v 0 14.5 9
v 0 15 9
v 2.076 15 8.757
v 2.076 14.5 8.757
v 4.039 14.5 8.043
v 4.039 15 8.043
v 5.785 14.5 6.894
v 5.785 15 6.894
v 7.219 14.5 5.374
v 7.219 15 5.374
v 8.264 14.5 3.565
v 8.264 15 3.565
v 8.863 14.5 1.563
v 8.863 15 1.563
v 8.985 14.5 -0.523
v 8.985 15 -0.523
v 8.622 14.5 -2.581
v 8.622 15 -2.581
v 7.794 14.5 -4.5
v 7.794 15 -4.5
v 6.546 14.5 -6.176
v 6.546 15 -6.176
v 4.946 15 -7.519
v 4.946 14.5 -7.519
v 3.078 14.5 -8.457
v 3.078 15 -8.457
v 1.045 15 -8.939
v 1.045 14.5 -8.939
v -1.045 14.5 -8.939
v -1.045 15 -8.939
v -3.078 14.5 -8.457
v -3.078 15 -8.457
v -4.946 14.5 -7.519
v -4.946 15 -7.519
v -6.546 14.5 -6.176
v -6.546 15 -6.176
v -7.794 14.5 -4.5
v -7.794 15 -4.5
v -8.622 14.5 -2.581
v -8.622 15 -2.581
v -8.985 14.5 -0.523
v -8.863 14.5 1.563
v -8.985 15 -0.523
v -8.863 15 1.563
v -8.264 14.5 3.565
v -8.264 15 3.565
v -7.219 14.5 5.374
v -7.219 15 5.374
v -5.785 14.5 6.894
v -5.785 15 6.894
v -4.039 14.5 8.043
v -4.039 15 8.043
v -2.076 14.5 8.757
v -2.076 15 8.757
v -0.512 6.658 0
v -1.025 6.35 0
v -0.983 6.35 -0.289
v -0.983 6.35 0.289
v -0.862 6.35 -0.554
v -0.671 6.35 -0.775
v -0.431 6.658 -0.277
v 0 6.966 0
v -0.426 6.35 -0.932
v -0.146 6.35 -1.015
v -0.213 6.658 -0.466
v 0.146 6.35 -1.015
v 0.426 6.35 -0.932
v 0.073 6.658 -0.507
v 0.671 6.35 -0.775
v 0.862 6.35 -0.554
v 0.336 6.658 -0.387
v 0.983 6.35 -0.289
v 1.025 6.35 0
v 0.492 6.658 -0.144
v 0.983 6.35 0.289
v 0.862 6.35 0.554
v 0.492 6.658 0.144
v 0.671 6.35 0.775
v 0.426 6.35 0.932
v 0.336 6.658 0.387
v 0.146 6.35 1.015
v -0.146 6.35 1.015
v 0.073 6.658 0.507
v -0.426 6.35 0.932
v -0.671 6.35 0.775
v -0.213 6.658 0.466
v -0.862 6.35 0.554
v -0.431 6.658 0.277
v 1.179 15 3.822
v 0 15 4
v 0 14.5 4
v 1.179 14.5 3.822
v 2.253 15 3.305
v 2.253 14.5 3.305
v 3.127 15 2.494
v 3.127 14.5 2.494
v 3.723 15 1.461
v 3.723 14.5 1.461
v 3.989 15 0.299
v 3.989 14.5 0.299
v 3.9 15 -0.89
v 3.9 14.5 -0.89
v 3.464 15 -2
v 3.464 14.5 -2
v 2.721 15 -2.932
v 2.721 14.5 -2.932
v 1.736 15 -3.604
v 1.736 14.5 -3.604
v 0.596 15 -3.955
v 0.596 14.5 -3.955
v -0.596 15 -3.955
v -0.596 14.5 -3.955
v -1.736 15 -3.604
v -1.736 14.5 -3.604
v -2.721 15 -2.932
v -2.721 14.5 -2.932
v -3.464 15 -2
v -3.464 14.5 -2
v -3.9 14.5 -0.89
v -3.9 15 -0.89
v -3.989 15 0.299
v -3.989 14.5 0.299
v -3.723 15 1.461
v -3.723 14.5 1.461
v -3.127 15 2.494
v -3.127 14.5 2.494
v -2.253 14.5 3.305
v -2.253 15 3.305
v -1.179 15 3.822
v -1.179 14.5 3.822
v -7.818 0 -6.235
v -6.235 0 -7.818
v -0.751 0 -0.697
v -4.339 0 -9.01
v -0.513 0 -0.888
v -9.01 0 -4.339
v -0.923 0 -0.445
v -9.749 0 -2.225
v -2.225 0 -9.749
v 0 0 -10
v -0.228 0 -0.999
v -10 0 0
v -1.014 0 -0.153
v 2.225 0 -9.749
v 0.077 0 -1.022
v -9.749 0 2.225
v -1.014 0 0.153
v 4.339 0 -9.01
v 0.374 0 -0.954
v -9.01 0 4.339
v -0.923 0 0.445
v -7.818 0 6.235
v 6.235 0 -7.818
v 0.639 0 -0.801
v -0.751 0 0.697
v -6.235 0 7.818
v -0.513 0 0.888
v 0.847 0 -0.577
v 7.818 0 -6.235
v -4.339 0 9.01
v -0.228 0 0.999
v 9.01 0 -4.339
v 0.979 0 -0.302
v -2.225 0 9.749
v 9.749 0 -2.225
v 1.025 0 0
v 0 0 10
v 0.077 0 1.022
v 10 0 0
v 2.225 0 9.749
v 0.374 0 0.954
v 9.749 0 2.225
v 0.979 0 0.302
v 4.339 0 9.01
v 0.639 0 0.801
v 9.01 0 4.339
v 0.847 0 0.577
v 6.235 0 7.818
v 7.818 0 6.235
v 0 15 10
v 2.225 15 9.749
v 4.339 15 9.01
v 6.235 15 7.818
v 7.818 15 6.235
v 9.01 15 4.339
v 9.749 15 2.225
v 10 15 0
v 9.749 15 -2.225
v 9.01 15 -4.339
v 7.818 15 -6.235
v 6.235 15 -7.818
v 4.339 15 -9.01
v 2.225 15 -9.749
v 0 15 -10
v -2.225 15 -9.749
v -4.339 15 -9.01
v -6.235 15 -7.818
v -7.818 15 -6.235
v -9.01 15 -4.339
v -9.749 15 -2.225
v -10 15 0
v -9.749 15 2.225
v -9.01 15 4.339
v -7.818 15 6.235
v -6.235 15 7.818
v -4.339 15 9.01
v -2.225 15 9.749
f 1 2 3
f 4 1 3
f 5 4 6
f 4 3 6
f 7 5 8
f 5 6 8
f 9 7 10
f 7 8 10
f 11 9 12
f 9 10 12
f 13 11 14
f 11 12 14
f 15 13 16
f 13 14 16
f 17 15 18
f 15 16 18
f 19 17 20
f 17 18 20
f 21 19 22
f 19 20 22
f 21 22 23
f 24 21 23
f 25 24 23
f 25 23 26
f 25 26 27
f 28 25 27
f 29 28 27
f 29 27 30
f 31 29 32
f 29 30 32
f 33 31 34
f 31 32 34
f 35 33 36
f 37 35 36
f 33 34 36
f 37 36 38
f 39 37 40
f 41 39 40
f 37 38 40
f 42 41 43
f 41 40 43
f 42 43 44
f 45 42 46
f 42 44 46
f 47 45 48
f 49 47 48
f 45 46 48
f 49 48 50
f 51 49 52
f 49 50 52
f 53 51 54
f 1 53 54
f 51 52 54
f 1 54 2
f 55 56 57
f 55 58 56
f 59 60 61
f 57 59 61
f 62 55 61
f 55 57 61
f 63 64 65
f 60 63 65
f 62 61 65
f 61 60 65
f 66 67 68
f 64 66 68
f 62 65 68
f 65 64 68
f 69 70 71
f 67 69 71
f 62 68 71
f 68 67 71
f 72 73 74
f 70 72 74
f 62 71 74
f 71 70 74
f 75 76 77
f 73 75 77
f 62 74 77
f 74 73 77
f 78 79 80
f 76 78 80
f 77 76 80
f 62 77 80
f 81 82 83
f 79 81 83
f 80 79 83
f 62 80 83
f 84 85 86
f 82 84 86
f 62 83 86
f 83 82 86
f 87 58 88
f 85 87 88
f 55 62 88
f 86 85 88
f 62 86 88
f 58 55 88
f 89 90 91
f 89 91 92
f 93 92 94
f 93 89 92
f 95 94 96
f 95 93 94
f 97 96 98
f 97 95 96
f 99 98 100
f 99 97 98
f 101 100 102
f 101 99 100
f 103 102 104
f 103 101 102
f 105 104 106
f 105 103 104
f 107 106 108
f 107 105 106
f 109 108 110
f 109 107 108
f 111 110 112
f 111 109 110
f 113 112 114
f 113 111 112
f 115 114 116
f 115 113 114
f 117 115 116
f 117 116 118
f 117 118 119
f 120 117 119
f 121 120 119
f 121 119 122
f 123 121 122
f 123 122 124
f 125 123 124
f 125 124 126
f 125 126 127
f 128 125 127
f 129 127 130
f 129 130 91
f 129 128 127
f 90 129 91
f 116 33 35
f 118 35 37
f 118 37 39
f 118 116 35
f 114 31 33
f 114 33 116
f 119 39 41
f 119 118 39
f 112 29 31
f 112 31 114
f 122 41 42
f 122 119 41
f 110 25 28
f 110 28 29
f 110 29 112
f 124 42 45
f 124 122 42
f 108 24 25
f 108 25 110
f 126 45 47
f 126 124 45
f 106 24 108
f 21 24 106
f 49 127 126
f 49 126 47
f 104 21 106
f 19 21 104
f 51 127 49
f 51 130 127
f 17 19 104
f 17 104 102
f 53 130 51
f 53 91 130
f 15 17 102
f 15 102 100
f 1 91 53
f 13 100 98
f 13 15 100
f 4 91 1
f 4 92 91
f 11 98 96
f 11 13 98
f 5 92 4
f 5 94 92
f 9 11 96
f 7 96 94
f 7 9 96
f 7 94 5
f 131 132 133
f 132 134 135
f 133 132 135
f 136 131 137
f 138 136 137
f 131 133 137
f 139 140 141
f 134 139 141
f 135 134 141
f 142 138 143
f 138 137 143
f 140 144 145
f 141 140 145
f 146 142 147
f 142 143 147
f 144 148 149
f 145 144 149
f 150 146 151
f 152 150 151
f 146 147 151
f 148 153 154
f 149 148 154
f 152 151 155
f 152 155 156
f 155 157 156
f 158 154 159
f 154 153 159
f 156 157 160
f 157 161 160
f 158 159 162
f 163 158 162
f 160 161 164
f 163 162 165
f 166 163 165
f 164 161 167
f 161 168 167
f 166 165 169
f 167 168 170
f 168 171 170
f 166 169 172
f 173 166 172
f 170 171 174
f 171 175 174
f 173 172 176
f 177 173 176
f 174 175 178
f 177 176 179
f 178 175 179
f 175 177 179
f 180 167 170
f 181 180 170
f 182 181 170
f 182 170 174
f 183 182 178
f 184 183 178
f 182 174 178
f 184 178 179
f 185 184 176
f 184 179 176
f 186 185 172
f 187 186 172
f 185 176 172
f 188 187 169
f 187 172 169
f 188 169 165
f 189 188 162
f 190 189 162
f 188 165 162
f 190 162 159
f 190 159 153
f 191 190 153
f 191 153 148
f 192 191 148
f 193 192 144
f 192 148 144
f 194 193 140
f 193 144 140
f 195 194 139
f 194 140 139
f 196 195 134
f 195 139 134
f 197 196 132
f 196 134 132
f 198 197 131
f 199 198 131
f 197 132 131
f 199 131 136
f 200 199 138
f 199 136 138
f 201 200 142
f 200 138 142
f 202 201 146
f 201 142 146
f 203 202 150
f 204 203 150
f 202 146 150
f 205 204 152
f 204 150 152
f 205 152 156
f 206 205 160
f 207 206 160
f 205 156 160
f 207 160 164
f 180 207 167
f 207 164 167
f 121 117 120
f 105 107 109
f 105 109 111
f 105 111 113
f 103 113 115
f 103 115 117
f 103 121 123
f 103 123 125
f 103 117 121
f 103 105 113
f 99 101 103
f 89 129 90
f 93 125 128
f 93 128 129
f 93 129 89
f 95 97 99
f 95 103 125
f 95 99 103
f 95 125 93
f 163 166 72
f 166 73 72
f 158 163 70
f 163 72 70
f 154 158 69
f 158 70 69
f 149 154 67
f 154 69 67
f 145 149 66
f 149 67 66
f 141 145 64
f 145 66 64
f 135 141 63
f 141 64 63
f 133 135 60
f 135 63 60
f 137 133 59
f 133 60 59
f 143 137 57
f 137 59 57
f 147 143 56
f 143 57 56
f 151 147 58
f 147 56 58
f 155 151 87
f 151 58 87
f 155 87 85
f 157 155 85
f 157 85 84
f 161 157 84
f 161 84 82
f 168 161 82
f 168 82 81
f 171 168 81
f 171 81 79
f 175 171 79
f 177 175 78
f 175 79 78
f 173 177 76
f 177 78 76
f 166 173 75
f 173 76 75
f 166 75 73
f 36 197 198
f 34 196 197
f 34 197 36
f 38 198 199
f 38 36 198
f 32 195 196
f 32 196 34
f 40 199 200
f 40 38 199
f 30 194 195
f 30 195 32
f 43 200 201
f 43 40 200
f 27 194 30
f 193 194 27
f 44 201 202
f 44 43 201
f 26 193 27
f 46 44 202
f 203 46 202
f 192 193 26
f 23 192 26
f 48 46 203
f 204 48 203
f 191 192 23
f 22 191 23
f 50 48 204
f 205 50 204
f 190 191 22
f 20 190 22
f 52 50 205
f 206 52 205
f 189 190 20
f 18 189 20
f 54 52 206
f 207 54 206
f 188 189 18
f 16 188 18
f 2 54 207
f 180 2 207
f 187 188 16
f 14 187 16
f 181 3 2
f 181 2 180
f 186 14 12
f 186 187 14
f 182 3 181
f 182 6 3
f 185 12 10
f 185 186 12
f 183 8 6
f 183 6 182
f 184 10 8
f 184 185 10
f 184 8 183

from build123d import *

# Parameters (mm, degrees)
SKETCH1_R                    = 10
BOSS_EXTRUDE1_DEPTH          = 15
SKETCH2_R                    = 9
SKETCH2_R_2                  = 4
CUT_EXTRUDE1_DEPTH           = 0.5
M2_5X0_45_TAPPED_HOLE1_D     = 2.05
M2_5X0_45_TAPPED_HOLE1_DEPTH = 6.35
M2_5X0_45_TAPPED_HOLE1_TIP   = 0.615882135


with BuildPart() as part:
    # Sketch1 → Boss-Extrude1 (new body)
    with BuildSketch(Plane(origin=(0, 0, 0), x_dir=(1, 0, 0), z_dir=(0, 1, 0))):
        with Locations(Location((0, 0, 0), (0, 0, 270))):
            Circle(SKETCH1_R)
    extrude(amount=BOSS_EXTRUDE1_DEPTH)

    # Sketch2 → Cut-Extrude1 (cut)
    with BuildSketch(Plane(origin=(0, 15, 0), x_dir=(1, 0, 0), z_dir=(0, 1, 0))):
        with Locations(Location((0, 0, 0), (0, 0, 270))):
            Circle(SKETCH2_R)
        with Locations(Location((0, 0, 0), (0, 0, 270))):
            Circle(SKETCH2_R_2, mode=Mode.SUBTRACT)
    extrude(amount=-CUT_EXTRUDE1_DEPTH, mode=Mode.SUBTRACT)

    # M2.5x0.45 Tapped Hole1
    with Locations(Plane(origin=(0, 0, 0), x_dir=(-1, 0, 0), z_dir=(0, -1, 0))):
        with Locations((0, 0)):
            Hole(M2_5X0_45_TAPPED_HOLE1_D / 2, depth=M2_5X0_45_TAPPED_HOLE1_DEPTH)
            with Locations((0, 0, -(M2_5X0_45_TAPPED_HOLE1_DEPTH + M2_5X0_45_TAPPED_HOLE1_TIP / 2))):  # 118° drill point
                Cone(0, M2_5X0_45_TAPPED_HOLE1_D / 2, M2_5X0_45_TAPPED_HOLE1_TIP, mode=Mode.SUBTRACT)


solid = part.part
